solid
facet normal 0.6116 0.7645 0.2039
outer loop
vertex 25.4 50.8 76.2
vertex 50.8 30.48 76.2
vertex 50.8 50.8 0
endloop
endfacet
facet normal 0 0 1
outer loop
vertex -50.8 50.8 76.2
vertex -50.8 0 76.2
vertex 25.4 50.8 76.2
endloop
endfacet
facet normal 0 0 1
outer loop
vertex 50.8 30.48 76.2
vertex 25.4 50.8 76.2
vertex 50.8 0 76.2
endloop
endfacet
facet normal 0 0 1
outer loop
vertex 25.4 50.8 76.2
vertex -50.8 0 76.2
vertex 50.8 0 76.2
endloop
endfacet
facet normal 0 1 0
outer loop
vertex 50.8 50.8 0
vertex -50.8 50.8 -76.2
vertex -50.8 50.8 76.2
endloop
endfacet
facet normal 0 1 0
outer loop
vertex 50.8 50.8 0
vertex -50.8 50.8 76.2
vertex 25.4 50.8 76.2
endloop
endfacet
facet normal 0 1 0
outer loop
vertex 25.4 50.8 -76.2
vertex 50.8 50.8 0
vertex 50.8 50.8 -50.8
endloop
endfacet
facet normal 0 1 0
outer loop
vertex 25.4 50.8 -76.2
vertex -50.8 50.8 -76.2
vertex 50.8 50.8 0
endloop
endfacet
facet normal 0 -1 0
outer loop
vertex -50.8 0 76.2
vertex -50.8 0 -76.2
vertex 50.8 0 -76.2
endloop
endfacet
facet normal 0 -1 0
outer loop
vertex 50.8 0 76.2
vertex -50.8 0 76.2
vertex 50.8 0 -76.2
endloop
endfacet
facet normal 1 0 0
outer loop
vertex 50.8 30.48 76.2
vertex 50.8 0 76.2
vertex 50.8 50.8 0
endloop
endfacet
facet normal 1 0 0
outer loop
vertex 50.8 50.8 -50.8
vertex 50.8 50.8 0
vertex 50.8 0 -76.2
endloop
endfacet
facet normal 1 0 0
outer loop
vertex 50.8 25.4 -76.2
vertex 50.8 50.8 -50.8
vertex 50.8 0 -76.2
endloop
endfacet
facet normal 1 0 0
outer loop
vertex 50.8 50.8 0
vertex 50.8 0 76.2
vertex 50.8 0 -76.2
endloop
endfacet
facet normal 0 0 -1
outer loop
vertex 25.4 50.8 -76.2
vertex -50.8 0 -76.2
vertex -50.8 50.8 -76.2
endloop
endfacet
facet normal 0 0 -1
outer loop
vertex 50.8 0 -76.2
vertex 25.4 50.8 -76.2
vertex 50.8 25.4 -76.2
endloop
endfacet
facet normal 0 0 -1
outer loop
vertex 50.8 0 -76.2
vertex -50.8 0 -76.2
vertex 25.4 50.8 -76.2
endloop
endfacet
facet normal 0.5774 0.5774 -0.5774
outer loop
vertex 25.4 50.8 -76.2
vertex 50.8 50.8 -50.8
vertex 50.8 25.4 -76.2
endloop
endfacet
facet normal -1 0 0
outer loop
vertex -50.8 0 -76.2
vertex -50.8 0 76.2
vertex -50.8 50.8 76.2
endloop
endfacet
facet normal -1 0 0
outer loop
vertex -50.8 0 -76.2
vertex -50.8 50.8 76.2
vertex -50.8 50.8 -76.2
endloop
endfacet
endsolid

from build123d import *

# Parameters (mm, degrees)
SKETCH1_W           = 101.6
SKETCH1_H           = 152.4
BOSS_EXTRUDE2_DEPTH = 50.8
CUT_EXTRUDE1_DEPTH  = 141.672729153
CUT_EXTRUDE2_DEPTH  = 171.388379885


with BuildPart() as part:
    # Sketch1 → Boss-Extrude2 (new body)
    with BuildSketch(Plane(origin=(0, 0, 0), x_dir=(1, 0, 0), z_dir=(0, 1, 0))):
        Rectangle(SKETCH1_W, SKETCH1_H)
    extrude(amount=BOSS_EXTRUDE2_DEPTH)

    # Sketch5 → Cut-Extrude1 (cut, through all)
    with BuildSketch(Plane(origin=(42.751168831, 53.438961039, 14.25038961), x_dir=(0.7911852033335972, -0.5909267078840152, -0.15758045543573734), z_dir=(0.6115766297251511, 0.764470787156438, 0.20385887657505006))):
        Polygon((-21.9306033, -60.537839749), (10.173131569, 13.089262648), (10.173131569, -65.773544809), align=None)
    extrude(amount=CUT_EXTRUDE1_DEPTH, mode=Mode.SUBTRACT)

    # Sketch7 → Cut-Extrude2 (cut, through all)
    with BuildSketch(Plane(origin=(50.8, 50.8, -50.8), x_dir=(0.8164965809277263, -0.40824829046386296, 0.40824829046386296), z_dir=(-0.5773502691896256, -0.5773502691896258, 0.5773502691896258))):
        Polygon((0, 0), (0, -35.921024484), (-31.108519733, -17.960512242), align=None)
    extrude(amount=-CUT_EXTRUDE2_DEPTH, mode=Mode.SUBTRACT)


solid = part.part
